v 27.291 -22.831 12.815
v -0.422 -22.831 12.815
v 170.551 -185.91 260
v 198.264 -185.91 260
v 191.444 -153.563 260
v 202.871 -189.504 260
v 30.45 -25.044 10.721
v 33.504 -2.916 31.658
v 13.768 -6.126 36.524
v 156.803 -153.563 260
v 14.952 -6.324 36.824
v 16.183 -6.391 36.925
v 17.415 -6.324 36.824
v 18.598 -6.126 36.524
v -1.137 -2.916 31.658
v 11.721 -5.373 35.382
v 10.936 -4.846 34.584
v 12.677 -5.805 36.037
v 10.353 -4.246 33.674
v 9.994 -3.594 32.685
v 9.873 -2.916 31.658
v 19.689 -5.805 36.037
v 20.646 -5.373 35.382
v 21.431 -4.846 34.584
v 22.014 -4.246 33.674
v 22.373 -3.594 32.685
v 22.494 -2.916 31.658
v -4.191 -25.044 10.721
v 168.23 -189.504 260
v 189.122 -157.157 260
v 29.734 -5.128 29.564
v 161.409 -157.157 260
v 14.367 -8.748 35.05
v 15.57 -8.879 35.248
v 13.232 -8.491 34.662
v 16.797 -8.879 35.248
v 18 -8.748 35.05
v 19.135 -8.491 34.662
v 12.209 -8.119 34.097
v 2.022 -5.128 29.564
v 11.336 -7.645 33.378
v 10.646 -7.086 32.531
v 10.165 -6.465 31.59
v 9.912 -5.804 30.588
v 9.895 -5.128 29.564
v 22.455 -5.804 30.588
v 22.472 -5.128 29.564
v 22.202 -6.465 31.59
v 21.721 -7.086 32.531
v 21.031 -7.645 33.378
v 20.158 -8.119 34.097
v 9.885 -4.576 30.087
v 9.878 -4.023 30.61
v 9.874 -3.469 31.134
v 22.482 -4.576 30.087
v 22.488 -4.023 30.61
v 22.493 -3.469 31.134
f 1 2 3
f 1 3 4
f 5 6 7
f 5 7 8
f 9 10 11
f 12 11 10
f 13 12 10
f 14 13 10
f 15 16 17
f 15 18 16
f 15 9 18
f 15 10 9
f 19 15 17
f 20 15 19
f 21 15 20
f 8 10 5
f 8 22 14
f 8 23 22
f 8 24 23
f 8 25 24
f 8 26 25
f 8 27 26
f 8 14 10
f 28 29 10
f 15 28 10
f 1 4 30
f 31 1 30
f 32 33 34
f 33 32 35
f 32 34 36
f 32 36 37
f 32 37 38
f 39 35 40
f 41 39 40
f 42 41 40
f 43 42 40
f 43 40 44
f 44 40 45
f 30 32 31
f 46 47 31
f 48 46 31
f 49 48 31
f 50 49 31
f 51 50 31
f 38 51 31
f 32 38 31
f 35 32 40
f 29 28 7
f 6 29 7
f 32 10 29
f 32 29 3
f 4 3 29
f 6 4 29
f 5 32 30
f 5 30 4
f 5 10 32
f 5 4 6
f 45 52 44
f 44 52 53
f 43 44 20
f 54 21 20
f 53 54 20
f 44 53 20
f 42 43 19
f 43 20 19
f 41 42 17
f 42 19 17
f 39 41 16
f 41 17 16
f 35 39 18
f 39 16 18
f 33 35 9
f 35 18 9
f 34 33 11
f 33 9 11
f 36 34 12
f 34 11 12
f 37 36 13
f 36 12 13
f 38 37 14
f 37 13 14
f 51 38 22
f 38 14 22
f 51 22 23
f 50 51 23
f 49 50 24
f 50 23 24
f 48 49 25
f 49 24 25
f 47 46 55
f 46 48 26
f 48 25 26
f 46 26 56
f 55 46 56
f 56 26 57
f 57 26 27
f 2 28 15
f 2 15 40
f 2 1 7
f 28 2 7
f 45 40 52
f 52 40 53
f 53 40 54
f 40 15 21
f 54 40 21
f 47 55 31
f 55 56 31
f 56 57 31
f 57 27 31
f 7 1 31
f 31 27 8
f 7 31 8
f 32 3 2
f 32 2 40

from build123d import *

# Parameters (mm, degrees)
F4_W      = 30
F4_H      = 30
F4_W_2    = 24
F4_H_2    = 24
F5_DEPTH  = 1000
F7_W      = 1359.9022671681
F7_H      = 1462.2605508027
F8_DEPTH  = 477.3996029769
F11_W     = 260.7968747616
F11_H     = 228.6183834076
F12_DEPTH = 46.9924863148
F13_R     = 6.3105959623
F14_DEPTH = 3


with BuildPart() as f5:
    # F4 (on face) → F5 (new body)
    with BuildSketch(Plane(origin=(0, 0, 0), x_dir=(0.8660254038, 0.2753467822, -0.4173537463), z_dir=(0.5, -0.4769146164, 0.7228778933))):
        Rectangle(F4_W, F4_H)
        Rectangle(F4_W_2, F4_H_2, mode=Mode.SUBTRACT)
    extrude(amount=F5_DEPTH)

    # F7 (on offset) → F8 (cut, through all)
    with BuildSketch(Plane.XY.offset(260)):
        with Locations((509.8009683141, -255.676958236)):
            Rectangle(F7_W, F7_H)
    extrude(amount=F8_DEPTH, mode=Mode.SUBTRACT)

    # F11 (on face) → F12 (cut, through all)
    with BuildSketch(Plane(origin=(0, -17.1818181667, 18.1599869076), x_dir=(1, 0, 0), z_dir=(0, -0.6872727267, 0.7263994763))):
        Rectangle(F11_W, F11_H)
    extrude(amount=-F12_DEPTH, mode=Mode.SUBTRACT)

    # F13 (on face) → F14 (cut, through all)
    with BuildSketch(Plane(origin=(0, 12.5206123889, 8.2604034651), x_dir=(-1, 0, 0), z_dir=(0, 0.8347074926, 0.5506935643))):
        with Locations((-16.1834571395, 28.0305700078)):
            Circle(F13_R)
    extrude(amount=-F14_DEPTH, mode=Mode.SUBTRACT)


solid = f5.part
